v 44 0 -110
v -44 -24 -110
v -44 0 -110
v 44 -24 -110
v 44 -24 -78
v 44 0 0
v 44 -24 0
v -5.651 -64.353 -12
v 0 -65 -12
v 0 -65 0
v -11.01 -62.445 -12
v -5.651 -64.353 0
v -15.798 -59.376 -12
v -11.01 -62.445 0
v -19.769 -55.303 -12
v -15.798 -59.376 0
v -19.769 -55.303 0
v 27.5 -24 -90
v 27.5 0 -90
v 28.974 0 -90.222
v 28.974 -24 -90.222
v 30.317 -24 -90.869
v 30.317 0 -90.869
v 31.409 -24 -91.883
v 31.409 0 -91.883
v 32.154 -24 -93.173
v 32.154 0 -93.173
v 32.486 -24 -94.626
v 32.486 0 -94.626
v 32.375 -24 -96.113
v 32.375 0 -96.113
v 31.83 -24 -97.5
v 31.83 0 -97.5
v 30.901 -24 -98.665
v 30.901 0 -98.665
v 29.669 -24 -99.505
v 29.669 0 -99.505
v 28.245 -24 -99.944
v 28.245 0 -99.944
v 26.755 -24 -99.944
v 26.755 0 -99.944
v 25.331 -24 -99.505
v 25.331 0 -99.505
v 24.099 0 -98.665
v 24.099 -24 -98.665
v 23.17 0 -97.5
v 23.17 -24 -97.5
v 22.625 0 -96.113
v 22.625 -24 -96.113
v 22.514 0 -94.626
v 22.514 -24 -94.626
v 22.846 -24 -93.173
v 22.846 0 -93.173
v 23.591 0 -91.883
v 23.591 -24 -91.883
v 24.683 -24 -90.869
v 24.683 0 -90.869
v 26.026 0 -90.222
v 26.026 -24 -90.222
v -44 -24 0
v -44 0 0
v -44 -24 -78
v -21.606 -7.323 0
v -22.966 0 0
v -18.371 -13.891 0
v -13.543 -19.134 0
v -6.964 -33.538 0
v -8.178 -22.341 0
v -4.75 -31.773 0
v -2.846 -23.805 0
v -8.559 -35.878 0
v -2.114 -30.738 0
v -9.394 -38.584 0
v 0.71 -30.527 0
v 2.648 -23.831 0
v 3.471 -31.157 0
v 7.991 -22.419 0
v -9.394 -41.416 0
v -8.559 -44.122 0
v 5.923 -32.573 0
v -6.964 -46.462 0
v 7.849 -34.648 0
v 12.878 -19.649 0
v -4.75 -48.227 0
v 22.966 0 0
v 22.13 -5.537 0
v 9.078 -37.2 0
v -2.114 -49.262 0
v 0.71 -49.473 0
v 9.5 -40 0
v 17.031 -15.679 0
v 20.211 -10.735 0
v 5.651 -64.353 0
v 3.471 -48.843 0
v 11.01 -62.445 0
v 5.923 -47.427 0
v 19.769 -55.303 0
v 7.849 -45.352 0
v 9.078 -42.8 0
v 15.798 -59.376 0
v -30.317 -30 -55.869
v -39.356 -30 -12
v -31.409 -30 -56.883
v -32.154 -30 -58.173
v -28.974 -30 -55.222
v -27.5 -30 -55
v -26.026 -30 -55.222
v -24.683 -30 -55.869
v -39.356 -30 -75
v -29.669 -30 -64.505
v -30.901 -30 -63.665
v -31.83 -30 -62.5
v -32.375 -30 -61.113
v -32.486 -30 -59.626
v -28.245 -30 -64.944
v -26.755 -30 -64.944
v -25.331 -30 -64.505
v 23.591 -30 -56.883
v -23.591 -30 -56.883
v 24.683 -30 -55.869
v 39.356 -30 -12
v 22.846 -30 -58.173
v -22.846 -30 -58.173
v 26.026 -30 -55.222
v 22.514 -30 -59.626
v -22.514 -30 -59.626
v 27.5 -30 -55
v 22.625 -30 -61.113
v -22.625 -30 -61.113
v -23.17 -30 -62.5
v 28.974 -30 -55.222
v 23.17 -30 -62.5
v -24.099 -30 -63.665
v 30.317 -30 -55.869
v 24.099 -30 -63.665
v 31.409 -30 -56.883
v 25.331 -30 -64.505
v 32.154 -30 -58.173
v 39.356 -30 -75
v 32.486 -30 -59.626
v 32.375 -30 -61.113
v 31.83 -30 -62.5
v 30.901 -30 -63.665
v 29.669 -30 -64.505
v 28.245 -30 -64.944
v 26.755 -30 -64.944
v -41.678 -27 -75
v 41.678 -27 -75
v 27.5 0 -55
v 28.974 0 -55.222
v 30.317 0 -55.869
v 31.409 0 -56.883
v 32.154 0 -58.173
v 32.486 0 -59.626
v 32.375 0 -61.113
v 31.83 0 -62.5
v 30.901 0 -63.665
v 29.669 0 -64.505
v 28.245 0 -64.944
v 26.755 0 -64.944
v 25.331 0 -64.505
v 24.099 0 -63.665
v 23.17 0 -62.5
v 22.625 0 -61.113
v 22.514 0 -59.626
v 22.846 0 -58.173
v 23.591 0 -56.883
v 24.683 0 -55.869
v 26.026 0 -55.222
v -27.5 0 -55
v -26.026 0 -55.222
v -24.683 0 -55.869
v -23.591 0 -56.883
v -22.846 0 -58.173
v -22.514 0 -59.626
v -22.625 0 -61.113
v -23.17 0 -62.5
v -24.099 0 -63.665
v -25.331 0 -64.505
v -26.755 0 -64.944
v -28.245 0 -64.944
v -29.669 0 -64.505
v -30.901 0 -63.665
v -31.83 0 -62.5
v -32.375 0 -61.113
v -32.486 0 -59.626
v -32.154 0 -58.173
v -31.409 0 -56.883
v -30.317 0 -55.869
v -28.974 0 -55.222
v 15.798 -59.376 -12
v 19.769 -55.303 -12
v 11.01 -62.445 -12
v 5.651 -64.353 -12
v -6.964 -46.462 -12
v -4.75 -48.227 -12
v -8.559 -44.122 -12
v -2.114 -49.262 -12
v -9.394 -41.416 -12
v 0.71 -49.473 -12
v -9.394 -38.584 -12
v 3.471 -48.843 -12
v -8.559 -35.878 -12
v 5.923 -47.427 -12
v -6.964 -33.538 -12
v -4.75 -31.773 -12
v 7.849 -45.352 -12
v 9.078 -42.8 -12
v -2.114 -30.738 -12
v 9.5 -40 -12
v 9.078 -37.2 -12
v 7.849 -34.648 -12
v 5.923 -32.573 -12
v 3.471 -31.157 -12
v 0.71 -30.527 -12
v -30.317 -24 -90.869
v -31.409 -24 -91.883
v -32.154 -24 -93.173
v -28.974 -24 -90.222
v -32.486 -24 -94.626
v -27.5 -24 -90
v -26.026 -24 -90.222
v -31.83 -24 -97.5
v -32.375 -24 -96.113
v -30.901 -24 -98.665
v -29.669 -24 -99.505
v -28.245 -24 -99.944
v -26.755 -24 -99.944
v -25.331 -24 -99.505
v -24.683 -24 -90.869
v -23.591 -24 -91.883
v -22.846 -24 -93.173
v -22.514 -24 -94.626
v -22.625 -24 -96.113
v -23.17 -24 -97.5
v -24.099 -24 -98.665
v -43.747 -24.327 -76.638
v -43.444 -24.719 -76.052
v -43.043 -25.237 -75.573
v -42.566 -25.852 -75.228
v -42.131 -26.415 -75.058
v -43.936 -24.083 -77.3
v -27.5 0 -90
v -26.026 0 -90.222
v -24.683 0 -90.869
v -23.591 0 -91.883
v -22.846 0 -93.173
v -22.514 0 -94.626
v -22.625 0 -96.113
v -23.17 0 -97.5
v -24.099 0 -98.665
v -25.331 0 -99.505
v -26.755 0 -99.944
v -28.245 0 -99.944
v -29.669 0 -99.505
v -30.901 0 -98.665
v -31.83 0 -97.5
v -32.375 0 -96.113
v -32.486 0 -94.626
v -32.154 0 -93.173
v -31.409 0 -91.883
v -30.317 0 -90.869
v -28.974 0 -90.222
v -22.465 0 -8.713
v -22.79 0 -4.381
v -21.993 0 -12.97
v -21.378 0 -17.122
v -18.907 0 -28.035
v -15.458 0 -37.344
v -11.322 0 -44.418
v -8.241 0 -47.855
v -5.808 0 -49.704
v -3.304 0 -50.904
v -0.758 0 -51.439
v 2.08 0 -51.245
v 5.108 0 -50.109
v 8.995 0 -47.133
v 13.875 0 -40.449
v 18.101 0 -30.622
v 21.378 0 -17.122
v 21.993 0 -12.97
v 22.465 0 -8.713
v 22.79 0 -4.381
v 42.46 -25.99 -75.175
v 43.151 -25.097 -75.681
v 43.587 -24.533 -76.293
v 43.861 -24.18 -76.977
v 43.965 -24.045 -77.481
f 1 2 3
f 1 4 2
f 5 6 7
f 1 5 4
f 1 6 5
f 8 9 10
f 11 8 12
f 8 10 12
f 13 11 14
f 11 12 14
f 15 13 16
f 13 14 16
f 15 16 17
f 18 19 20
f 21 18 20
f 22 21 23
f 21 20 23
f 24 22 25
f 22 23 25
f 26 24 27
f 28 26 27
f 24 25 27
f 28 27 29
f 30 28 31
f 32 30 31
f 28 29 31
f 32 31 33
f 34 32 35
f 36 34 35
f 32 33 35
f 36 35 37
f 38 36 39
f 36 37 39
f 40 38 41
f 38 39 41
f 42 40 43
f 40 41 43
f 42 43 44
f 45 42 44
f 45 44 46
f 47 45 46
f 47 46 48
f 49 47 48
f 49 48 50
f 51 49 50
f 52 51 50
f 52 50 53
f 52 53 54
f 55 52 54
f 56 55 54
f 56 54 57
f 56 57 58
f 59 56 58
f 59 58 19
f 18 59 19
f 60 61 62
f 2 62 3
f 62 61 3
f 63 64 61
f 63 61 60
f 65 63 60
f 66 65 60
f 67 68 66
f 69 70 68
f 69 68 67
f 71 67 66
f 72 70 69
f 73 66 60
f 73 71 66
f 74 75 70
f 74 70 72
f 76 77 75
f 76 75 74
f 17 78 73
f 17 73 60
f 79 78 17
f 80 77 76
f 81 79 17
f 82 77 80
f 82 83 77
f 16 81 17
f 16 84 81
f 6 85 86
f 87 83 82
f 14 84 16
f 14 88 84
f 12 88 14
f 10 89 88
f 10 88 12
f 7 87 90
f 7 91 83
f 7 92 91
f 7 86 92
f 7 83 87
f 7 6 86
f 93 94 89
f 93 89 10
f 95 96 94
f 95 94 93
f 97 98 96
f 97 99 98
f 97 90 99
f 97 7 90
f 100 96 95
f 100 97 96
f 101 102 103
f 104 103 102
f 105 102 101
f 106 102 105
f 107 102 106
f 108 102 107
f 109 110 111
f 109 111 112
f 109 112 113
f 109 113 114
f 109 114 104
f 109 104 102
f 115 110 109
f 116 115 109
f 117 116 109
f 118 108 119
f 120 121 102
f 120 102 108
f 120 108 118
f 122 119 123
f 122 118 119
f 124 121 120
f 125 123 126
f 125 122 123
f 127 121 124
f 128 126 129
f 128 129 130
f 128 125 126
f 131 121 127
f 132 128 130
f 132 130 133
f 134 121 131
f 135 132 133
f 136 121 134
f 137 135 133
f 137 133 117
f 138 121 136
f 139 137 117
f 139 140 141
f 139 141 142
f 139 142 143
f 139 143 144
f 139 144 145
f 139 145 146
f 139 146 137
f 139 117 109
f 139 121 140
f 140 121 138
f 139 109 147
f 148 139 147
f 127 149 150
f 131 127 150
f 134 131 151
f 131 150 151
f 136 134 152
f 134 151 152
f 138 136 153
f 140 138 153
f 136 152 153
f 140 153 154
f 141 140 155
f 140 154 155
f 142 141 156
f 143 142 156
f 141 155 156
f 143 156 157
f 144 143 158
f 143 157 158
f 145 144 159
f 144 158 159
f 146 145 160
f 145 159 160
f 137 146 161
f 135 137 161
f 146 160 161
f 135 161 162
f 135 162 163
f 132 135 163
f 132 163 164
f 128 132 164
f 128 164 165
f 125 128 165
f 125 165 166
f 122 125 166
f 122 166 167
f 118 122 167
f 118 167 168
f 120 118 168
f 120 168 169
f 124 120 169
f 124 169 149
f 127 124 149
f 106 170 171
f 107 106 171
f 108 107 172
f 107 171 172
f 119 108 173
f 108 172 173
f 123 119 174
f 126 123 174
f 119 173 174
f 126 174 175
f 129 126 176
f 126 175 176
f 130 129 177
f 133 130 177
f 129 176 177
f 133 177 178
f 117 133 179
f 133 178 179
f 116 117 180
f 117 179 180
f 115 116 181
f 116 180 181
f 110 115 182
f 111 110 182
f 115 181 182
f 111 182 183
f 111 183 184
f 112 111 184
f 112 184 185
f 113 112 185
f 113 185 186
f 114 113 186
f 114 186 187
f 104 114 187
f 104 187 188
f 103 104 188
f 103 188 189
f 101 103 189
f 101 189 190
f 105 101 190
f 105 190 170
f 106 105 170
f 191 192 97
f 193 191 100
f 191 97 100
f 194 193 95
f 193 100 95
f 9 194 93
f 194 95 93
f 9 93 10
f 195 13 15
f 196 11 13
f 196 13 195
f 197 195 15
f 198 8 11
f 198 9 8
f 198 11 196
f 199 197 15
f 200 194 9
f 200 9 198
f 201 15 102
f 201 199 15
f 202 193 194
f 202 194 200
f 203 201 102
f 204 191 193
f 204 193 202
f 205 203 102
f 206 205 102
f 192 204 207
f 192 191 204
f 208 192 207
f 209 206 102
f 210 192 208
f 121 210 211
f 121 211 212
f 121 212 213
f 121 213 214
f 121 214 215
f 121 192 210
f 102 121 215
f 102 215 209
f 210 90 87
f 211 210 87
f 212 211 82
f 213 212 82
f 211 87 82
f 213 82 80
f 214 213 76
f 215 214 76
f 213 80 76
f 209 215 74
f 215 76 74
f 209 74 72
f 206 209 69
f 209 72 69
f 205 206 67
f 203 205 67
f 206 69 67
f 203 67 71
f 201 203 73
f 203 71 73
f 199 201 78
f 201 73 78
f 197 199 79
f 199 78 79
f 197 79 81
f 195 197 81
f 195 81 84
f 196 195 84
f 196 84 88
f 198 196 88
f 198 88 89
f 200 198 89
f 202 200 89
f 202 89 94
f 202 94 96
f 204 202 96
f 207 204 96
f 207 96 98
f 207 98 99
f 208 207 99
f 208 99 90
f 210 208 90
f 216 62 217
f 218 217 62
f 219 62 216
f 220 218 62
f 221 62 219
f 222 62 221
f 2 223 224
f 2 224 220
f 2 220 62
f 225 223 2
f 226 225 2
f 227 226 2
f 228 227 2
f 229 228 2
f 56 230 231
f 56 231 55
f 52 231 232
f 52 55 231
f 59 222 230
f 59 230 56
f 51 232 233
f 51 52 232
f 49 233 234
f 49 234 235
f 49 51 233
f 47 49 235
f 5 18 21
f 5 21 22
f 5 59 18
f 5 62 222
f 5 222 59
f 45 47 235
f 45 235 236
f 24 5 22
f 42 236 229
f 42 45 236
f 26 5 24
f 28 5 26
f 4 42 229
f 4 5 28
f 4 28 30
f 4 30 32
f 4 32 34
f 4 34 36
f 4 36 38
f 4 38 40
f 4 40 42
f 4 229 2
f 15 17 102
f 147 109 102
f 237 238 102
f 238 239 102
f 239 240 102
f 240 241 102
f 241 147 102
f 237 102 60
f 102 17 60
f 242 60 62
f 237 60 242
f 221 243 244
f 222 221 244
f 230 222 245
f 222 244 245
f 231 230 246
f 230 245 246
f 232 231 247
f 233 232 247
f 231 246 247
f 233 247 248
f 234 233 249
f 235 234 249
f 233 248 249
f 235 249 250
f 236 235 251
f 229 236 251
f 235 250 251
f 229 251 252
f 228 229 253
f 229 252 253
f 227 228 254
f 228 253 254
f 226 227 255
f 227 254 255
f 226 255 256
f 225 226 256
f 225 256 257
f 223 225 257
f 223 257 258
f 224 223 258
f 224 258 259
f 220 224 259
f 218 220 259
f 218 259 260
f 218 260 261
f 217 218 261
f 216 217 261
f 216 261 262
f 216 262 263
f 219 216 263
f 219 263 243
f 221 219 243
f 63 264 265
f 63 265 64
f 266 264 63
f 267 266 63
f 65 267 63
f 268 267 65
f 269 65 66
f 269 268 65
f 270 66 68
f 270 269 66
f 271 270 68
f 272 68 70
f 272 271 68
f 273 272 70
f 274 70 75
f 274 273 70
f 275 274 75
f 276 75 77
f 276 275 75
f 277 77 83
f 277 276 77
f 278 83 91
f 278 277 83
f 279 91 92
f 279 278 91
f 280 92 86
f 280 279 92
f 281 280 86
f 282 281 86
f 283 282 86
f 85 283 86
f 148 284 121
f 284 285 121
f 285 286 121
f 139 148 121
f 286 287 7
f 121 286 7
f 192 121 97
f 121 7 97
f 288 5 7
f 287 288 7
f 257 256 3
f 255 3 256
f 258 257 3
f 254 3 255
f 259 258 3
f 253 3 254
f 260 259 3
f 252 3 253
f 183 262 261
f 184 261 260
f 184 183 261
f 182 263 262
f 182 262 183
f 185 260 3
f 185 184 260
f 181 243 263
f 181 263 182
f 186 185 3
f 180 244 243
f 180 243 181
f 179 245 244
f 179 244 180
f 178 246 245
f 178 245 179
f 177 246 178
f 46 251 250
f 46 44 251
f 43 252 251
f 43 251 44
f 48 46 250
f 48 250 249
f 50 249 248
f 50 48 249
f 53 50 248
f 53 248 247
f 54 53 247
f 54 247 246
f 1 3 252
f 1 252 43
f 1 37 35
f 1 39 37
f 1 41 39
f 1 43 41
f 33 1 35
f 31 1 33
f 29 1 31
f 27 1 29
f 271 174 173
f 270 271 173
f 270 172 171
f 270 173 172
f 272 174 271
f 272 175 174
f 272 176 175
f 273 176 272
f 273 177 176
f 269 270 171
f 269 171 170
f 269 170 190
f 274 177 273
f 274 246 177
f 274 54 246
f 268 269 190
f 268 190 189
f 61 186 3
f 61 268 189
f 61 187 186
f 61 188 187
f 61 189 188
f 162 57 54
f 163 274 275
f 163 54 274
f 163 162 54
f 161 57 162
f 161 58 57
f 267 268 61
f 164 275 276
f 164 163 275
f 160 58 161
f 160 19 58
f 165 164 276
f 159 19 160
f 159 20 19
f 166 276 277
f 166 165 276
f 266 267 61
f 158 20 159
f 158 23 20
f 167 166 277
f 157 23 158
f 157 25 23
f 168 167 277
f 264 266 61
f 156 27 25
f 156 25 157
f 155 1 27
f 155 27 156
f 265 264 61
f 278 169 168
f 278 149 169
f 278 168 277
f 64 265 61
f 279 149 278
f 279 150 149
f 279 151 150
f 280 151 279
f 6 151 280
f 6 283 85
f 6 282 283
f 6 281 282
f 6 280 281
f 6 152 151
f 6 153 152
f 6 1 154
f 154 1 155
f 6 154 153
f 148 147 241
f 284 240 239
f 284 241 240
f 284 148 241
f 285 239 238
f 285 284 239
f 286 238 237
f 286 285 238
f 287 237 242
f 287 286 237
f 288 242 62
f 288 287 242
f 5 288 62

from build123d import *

# Parameters (mm, degrees)
BOSS_EXTRUDE1_DEPTH            = 44
CUT_EXTRUDE1_REACH             = 129.516
SKETCH5_R                      = 23
CUT_EXTRUDE1_DIRECTION_2_REACH = 129.516
CUT_EXTRUDE2_REACH             = 137.133
SKETCH6_R                      = 5
CUT_EXTRUDE3_REACH             = 137.133
SKETCH7_R                      = 9.5


with BuildPart() as part:
    # Sketch1 → Boss-Extrude1 (new, symmetric)
    with BuildSketch(Plane(origin=(0, 0, 0), x_dir=(0, 0, -1), z_dir=(1, 0, 0))):
        with BuildLine():
            Line((0, 0), (0, -65))
            Line((0, -65), (12, -65))
            Line((12, -65), (12, -30))
            Line((12, -30), (75, -30))
            Line((75, -30), (75, -27))
            ThreePointArc((75, -27), (75.878679656, -24.878679656), (78, -24))
            Line((78, -24), (110, -24))
            Line((110, -24), (110, 0))
            Line((110, 0), (0, 0))
        make_face()
    extrude(amount=BOSS_EXTRUDE1_DEPTH, both=True)

    # Sketch5 → Cut-Extrude1 (cut, up to next)
    with BuildSketch(Plane(origin=(0, 6.55814551, -14.063988431), x_dir=(1, 0, 0), z_dir=(0, -0.42261826174069383, 0.9063077870366527)), mode=Mode.PRIVATE) as cut_extrude1_sk1:
        with Locations((0, 1.248613111)):
            Circle(SKETCH5_R)
    cut_extrude1_tool1 = extrude(cut_extrude1_sk1.sketch, amount=-CUT_EXTRUDE1_REACH, mode=Mode.PRIVATE) & part.part
    add(cut_extrude1_tool1.solids().sort_by_distance((0, 7.689773, -13.536302))[0], mode=Mode.SUBTRACT)

    # Sketch5 → Cut-Extrude1 direction 2 (cut, up to next)
    with BuildSketch(Plane(origin=(0, 6.55814551, -14.063988431), x_dir=(1, 0, 0), z_dir=(0, -0.42261826174069383, 0.9063077870366527)), mode=Mode.PRIVATE) as cut_extrude1_direction_2_sk1:
        with Locations((0, 1.248613111)):
            Circle(SKETCH5_R)
    cut_extrude1_direction_2_tool1 = extrude(cut_extrude1_direction_2_sk1.sketch, amount=CUT_EXTRUDE1_DIRECTION_2_REACH, mode=Mode.PRIVATE) & part.part
    add(cut_extrude1_direction_2_tool1.solids().sort_by_distance((0, 7.689773, -13.536302))[0], mode=Mode.SUBTRACT)

    # Sketch6 → Cut-Extrude2 (cut, up to next)
    with BuildSketch(Plane(origin=(0, 0, 0), x_dir=(1, 0, 0), z_dir=(0, 1, 0)), mode=Mode.PRIVATE) as cut_extrude2_sk1:
        with Locations(Location((27.5, 95, 0), (0, 0, 270))):
            Circle(SKETCH6_R)
    cut_extrude2_tool1 = extrude(cut_extrude2_sk1.sketch, amount=-CUT_EXTRUDE2_REACH, mode=Mode.PRIVATE) & part.part
    # Sketch6 → Cut-Extrude2 (cut, up to next)
    with BuildSketch(Plane(origin=(0, 0, 0), x_dir=(1, 0, 0), z_dir=(0, 1, 0)), mode=Mode.PRIVATE) as cut_extrude2_sk2:
        with Locations(Location((-27.5, 95, 0), (0, 0, 270))):
            Circle(SKETCH6_R)
    cut_extrude2_tool2 = extrude(cut_extrude2_sk2.sketch, amount=-CUT_EXTRUDE2_REACH, mode=Mode.PRIVATE) & part.part
    # Sketch6 → Cut-Extrude2 (cut, up to next)
    with BuildSketch(Plane(origin=(0, 0, 0), x_dir=(1, 0, 0), z_dir=(0, 1, 0)), mode=Mode.PRIVATE) as cut_extrude2_sk3:
        with Locations(Location((-27.5, 60, 0), (0, 0, 270))):
            Circle(SKETCH6_R)
    cut_extrude2_tool3 = extrude(cut_extrude2_sk3.sketch, amount=-CUT_EXTRUDE2_REACH, mode=Mode.PRIVATE) & part.part
    # Sketch6 → Cut-Extrude2 (cut, up to next)
    with BuildSketch(Plane(origin=(0, 0, 0), x_dir=(1, 0, 0), z_dir=(0, 1, 0)), mode=Mode.PRIVATE) as cut_extrude2_sk4:
        with Locations(Location((27.5, 60, 0), (0, 0, 270))):
            Circle(SKETCH6_R)
    cut_extrude2_tool4 = extrude(cut_extrude2_sk4.sketch, amount=-CUT_EXTRUDE2_REACH, mode=Mode.PRIVATE) & part.part
    add(cut_extrude2_tool1.solids().sort_by_distance((27.5, 0, -95))[0], mode=Mode.SUBTRACT)
    add(cut_extrude2_tool2.solids().sort_by_distance((-27.5, 0, -95))[0], mode=Mode.SUBTRACT)
    add(cut_extrude2_tool3.solids().sort_by_distance((-27.5, 0, -60))[0], mode=Mode.SUBTRACT)
    add(cut_extrude2_tool4.solids().sort_by_distance((27.5, 0, -60))[0], mode=Mode.SUBTRACT)

    # Sketch7 → Cut-Extrude3 (cut, up to next)
    with BuildSketch(Plane.XY, mode=Mode.PRIVATE) as cut_extrude3_sk1:
        with BuildLine():
            Line((44, -65), (44, -24))
            Line((44, -24), (19.769224603, -55.302867659))
            ThreePointArc((19.769224603, -55.302867659), (11.009729981, -62.445174219), (0, -65))
            Line((0, -65), (44, -65))
        make_face()
    cut_extrude3_tool1 = extrude(cut_extrude3_sk1.sketch, amount=-CUT_EXTRUDE3_REACH, mode=Mode.PRIVATE) & part.part
    # Sketch7 → Cut-Extrude3 (cut, up to next)
    with BuildSketch(Plane.XY, mode=Mode.PRIVATE) as cut_extrude3_sk2:
        with Locations((0, -40)):
            Circle(SKETCH7_R)
    cut_extrude3_tool2 = extrude(cut_extrude3_sk2.sketch, amount=-CUT_EXTRUDE3_REACH, mode=Mode.PRIVATE) & part.part
    # Sketch7 → Cut-Extrude3 (cut, up to next)
    with BuildSketch(Plane.XY, mode=Mode.PRIVATE) as cut_extrude3_sk3:
        with BuildLine():
            Line((-44, -65), (0, -65))
            ThreePointArc((0, -65), (-11.009729981, -62.445174219), (-19.769224603, -55.302867659))
            Line((-19.769224603, -55.302867659), (-44, -24))
            Line((-44, -24), (-44, -65))
        make_face()
    cut_extrude3_tool3 = extrude(cut_extrude3_sk3.sketch, amount=-CUT_EXTRUDE3_REACH, mode=Mode.PRIVATE) & part.part
    add(cut_extrude3_tool1.solids().sort_by_distance((32.710915, -51.707074, 0))[0], mode=Mode.SUBTRACT)
    add(cut_extrude3_tool2.solids().sort_by_distance((0, -40, 0))[0], mode=Mode.SUBTRACT)
    add(cut_extrude3_tool3.solids().sort_by_distance((-32.710915, -51.707074, 0))[0], mode=Mode.SUBTRACT)


solid = part.part
